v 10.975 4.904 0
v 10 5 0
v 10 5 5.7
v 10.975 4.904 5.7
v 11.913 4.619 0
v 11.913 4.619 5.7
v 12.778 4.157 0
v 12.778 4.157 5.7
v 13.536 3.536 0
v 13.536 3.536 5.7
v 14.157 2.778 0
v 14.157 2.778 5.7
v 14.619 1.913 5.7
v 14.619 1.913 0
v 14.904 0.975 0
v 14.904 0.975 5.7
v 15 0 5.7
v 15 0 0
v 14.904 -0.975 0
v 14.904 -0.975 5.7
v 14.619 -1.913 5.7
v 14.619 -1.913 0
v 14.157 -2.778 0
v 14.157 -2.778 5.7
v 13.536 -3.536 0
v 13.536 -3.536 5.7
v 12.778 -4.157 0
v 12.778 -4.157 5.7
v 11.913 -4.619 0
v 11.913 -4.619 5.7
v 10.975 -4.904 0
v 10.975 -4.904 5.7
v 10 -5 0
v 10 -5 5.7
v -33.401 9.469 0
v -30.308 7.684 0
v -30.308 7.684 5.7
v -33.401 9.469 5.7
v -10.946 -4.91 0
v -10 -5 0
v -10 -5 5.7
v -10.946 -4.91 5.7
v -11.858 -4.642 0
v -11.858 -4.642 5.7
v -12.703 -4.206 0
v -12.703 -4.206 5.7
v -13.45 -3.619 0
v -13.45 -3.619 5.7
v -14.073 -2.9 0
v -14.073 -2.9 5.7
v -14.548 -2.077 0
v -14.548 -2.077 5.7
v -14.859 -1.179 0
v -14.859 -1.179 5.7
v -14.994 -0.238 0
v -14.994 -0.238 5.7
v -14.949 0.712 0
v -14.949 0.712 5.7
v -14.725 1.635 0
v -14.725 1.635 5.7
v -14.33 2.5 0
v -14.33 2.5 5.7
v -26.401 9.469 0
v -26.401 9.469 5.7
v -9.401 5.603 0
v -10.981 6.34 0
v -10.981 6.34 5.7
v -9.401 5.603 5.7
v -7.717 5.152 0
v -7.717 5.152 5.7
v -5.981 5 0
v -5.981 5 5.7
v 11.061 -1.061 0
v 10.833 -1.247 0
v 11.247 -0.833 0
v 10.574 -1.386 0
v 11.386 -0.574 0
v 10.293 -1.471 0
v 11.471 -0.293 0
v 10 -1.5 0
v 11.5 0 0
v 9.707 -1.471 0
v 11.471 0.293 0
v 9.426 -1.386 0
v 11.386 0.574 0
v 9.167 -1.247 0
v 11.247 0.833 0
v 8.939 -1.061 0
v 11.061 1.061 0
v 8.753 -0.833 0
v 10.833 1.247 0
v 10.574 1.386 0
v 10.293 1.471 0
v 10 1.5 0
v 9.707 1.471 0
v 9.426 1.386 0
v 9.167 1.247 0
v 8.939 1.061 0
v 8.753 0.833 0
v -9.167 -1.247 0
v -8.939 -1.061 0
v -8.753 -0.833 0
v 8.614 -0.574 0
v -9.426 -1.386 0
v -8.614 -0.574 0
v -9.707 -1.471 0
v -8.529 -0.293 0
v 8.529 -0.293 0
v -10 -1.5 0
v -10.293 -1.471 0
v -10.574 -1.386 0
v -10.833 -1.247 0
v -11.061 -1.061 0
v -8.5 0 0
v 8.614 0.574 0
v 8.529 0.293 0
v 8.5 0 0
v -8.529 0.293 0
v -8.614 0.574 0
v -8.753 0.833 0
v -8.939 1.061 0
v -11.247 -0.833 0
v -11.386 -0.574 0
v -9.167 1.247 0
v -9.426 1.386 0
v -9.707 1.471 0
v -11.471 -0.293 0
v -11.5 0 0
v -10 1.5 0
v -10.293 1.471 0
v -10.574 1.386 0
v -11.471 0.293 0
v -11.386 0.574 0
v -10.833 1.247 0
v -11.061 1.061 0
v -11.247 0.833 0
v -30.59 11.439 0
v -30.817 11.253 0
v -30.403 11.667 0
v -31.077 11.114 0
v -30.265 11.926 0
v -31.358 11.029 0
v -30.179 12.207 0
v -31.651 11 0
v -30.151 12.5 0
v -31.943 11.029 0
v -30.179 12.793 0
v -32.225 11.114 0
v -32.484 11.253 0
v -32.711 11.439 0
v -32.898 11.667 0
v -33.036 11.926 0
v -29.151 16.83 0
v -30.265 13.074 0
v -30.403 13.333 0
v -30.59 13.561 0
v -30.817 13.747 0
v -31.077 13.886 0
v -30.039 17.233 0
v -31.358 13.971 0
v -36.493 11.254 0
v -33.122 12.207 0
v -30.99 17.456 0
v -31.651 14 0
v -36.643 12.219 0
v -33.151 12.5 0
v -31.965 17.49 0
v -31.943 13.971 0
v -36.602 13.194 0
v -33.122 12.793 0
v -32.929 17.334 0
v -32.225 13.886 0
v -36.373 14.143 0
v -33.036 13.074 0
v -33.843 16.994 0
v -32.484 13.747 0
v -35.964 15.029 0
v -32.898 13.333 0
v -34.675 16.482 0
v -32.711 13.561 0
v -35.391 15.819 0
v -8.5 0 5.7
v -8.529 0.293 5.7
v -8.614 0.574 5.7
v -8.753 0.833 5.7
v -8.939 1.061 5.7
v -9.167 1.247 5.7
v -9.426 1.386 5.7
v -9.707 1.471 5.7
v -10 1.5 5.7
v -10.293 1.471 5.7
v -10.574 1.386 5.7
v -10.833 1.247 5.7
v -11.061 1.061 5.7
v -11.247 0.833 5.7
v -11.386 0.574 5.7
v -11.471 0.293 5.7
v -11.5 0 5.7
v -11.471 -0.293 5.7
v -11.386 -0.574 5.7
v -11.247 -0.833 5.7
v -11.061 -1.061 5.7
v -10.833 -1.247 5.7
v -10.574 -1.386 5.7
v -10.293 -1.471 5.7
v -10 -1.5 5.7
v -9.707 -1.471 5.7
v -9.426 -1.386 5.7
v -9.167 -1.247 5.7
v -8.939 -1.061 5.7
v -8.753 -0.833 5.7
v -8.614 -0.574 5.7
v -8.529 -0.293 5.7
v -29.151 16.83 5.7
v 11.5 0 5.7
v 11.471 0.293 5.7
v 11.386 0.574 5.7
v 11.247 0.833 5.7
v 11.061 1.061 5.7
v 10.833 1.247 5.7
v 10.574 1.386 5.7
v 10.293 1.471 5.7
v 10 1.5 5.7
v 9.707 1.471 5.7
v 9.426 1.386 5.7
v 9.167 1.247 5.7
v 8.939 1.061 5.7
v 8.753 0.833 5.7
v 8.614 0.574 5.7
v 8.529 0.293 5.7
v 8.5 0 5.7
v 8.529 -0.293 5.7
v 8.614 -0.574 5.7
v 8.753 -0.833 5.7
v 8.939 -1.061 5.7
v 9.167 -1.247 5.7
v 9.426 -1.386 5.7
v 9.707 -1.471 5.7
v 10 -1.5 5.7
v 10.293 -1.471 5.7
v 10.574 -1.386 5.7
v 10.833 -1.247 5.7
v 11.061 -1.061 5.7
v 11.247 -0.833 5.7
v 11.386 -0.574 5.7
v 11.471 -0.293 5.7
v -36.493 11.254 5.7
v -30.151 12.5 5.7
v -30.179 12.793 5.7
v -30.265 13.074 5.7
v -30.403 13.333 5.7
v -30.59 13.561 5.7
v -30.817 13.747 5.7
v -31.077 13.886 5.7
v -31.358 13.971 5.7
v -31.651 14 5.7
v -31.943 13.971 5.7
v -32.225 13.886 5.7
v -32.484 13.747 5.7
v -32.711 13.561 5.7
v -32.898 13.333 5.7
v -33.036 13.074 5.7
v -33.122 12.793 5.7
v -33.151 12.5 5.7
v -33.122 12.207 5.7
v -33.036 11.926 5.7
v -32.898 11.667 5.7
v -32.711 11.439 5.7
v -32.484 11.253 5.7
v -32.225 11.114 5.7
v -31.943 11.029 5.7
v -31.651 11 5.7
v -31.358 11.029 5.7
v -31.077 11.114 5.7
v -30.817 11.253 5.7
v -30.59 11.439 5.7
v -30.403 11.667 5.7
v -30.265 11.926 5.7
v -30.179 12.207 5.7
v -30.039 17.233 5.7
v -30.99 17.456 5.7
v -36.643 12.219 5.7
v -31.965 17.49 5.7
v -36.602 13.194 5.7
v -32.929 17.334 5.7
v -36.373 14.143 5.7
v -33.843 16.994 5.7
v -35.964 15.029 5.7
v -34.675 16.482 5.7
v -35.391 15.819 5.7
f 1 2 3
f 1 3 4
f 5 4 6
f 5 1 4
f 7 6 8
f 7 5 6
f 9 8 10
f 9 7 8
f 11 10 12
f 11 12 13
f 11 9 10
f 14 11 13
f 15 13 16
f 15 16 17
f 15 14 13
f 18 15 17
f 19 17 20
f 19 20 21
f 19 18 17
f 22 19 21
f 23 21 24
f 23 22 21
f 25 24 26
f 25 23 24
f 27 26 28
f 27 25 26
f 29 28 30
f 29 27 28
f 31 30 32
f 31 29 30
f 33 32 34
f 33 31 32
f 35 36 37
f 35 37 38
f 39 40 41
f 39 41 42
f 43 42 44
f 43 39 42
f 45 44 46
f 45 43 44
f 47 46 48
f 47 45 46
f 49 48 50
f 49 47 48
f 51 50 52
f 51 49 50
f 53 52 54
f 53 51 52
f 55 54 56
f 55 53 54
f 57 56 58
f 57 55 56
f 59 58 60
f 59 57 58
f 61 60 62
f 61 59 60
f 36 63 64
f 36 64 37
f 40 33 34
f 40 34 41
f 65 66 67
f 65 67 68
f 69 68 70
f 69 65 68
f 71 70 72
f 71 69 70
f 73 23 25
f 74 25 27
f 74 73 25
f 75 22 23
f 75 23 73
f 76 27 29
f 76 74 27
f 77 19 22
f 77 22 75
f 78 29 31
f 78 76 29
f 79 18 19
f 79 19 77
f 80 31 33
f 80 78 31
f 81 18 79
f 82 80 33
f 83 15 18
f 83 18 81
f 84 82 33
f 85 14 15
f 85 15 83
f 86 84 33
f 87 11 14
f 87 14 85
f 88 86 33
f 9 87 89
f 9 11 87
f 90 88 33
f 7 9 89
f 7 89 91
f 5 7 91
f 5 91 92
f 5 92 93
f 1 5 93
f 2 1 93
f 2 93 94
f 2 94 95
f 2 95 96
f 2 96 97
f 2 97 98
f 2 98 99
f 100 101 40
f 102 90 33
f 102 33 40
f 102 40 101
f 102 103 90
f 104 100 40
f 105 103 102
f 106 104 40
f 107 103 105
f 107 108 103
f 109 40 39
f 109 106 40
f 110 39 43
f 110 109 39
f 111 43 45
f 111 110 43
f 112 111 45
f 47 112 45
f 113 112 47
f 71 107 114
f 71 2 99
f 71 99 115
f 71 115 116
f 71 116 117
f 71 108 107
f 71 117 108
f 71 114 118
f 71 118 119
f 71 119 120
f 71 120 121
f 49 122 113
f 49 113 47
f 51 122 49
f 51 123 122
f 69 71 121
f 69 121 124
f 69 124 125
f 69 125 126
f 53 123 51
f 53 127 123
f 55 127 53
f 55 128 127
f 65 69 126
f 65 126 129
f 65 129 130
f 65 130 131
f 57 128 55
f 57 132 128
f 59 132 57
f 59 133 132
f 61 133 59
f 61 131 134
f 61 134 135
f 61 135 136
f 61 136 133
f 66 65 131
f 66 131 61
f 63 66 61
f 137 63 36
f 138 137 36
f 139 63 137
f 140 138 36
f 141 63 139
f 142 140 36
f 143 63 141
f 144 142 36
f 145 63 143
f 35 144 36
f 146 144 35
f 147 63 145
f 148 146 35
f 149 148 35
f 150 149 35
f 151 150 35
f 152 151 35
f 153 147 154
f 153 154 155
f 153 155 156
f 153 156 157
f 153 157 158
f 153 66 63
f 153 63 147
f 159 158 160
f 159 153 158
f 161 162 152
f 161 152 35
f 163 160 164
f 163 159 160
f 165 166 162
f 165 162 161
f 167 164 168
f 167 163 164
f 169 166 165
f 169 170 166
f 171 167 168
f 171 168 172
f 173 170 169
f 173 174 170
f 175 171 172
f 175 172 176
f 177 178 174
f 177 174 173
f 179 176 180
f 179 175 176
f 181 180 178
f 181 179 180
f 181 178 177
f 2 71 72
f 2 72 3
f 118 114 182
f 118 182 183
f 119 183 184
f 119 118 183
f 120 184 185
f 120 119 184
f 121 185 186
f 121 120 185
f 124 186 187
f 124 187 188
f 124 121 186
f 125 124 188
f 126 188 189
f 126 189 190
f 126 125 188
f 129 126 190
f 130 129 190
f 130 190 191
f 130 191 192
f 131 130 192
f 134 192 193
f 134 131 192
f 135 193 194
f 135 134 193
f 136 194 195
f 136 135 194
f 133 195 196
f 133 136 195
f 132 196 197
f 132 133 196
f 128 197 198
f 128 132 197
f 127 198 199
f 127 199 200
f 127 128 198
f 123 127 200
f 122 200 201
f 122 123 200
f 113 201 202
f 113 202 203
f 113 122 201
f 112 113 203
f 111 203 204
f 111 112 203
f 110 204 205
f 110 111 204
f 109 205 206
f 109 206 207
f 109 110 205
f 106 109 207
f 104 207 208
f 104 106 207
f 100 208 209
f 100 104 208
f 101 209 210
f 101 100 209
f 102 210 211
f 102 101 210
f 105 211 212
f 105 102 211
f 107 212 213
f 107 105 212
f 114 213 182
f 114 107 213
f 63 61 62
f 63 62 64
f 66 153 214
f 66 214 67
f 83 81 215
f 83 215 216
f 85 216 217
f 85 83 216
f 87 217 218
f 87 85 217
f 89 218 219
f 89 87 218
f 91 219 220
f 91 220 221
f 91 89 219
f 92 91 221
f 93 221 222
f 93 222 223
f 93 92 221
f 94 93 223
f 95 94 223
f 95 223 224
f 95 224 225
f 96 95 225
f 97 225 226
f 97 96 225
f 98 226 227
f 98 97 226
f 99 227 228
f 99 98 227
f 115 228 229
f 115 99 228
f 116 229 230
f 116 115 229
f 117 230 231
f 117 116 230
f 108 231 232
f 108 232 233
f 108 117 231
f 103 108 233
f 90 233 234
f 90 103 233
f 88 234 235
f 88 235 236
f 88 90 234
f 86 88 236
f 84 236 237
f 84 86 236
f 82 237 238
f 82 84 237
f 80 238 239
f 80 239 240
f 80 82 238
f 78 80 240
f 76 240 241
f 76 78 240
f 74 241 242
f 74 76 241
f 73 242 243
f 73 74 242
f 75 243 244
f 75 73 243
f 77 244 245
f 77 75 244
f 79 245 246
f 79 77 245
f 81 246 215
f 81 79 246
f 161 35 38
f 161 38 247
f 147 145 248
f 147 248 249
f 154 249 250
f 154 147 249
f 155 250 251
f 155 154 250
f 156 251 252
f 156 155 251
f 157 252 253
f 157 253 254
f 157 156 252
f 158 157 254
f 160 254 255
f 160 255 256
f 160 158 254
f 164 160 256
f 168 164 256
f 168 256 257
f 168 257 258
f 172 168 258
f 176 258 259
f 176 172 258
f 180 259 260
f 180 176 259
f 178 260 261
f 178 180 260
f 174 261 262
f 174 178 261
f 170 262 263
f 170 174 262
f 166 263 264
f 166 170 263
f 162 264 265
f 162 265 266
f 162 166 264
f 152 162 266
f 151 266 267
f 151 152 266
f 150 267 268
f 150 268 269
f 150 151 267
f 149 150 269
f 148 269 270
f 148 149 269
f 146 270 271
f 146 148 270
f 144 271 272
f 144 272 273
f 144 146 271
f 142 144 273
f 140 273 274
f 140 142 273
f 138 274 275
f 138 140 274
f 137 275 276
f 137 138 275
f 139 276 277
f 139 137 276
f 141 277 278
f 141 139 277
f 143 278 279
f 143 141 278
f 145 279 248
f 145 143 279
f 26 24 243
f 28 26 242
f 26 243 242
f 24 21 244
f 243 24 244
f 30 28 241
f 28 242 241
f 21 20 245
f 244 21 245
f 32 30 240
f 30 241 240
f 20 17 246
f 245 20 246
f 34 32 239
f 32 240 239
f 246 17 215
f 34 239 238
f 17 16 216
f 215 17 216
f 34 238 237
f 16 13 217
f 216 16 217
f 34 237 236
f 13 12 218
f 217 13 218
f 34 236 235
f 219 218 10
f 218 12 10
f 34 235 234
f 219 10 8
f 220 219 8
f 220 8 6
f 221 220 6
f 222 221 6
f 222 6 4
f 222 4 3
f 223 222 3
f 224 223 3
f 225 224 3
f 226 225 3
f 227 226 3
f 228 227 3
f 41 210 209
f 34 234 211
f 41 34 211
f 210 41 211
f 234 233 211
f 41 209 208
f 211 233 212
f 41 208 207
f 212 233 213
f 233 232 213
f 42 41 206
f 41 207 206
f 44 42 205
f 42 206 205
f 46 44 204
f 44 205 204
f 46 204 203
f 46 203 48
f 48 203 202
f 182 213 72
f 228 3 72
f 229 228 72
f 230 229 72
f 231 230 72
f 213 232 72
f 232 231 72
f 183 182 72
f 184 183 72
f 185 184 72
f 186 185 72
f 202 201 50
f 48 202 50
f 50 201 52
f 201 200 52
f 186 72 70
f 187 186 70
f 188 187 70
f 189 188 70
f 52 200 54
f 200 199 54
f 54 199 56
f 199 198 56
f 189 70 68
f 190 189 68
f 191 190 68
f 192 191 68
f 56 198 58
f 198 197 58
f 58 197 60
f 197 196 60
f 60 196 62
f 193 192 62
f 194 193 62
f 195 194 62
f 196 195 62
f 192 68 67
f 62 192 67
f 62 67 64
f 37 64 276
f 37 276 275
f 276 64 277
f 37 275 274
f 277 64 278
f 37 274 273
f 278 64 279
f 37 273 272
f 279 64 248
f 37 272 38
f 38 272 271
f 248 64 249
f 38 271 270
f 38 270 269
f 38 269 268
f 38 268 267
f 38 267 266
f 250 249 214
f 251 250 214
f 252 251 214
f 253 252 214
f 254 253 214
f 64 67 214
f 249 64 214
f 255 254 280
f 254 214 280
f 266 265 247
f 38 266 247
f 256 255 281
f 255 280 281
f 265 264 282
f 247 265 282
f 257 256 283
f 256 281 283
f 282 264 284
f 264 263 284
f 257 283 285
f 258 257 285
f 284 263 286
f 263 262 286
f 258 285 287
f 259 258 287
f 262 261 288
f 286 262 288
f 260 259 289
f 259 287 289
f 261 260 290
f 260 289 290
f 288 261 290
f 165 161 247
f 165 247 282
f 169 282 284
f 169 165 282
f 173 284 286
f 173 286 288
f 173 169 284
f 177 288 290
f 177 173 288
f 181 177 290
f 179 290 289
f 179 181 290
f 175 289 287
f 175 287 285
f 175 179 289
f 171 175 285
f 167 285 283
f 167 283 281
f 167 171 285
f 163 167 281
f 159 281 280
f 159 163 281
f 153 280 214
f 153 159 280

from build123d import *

# Parameters (mm, degrees)
SKETCH_1_R      = 1.5
EXTRUDE_1_DEPTH = 5.7


with BuildPart() as part:
    # 스케치1 → 보스-돌출1 (new body)
    with BuildSketch(Plane.XY):
        with BuildLine():
            Line((-5.980762114, 5), (10, 5))
            ThreePointArc((10, 5), (15, 0), (10, -5))
            Line((10, -5), (-10, -5))
            ThreePointArc((-10, -5), (-14.330127019, -2.5), (-14.330127019, 2.5))
            Line((-14.330127019, 2.5), (-26.400635095, 9.468911087))
            Line((-26.400635095, 9.468911087), (-30.308305875, 7.68355398))
            Line((-30.308305875, 7.68355398), (-33.400635095, 9.468911087))
            Line((-33.400635095, 9.468911087), (-36.492964314, 11.254268194))
            ThreePointArc((-36.492964314, 11.254268194), (-34.674569114, 16.481937097), (-29.150635095, 16.830127019))
            Line((-29.150635095, 16.830127019), (-10.980762114, 6.339745962))
            ThreePointArc((-10.980762114, 6.339745962), (-8.568952565, 5.340741737), (-5.980762114, 5))
        make_face()
        with Locations((-10, 0)):
            Circle(SKETCH_1_R, mode=Mode.SUBTRACT)
        with Locations((10, 0)):
            Circle(SKETCH_1_R, mode=Mode.SUBTRACT)
        with Locations((-31.650635095, 12.5)):
            Circle(SKETCH_1_R, mode=Mode.SUBTRACT)
    extrude(amount=EXTRUDE_1_DEPTH)


solid = part.part
